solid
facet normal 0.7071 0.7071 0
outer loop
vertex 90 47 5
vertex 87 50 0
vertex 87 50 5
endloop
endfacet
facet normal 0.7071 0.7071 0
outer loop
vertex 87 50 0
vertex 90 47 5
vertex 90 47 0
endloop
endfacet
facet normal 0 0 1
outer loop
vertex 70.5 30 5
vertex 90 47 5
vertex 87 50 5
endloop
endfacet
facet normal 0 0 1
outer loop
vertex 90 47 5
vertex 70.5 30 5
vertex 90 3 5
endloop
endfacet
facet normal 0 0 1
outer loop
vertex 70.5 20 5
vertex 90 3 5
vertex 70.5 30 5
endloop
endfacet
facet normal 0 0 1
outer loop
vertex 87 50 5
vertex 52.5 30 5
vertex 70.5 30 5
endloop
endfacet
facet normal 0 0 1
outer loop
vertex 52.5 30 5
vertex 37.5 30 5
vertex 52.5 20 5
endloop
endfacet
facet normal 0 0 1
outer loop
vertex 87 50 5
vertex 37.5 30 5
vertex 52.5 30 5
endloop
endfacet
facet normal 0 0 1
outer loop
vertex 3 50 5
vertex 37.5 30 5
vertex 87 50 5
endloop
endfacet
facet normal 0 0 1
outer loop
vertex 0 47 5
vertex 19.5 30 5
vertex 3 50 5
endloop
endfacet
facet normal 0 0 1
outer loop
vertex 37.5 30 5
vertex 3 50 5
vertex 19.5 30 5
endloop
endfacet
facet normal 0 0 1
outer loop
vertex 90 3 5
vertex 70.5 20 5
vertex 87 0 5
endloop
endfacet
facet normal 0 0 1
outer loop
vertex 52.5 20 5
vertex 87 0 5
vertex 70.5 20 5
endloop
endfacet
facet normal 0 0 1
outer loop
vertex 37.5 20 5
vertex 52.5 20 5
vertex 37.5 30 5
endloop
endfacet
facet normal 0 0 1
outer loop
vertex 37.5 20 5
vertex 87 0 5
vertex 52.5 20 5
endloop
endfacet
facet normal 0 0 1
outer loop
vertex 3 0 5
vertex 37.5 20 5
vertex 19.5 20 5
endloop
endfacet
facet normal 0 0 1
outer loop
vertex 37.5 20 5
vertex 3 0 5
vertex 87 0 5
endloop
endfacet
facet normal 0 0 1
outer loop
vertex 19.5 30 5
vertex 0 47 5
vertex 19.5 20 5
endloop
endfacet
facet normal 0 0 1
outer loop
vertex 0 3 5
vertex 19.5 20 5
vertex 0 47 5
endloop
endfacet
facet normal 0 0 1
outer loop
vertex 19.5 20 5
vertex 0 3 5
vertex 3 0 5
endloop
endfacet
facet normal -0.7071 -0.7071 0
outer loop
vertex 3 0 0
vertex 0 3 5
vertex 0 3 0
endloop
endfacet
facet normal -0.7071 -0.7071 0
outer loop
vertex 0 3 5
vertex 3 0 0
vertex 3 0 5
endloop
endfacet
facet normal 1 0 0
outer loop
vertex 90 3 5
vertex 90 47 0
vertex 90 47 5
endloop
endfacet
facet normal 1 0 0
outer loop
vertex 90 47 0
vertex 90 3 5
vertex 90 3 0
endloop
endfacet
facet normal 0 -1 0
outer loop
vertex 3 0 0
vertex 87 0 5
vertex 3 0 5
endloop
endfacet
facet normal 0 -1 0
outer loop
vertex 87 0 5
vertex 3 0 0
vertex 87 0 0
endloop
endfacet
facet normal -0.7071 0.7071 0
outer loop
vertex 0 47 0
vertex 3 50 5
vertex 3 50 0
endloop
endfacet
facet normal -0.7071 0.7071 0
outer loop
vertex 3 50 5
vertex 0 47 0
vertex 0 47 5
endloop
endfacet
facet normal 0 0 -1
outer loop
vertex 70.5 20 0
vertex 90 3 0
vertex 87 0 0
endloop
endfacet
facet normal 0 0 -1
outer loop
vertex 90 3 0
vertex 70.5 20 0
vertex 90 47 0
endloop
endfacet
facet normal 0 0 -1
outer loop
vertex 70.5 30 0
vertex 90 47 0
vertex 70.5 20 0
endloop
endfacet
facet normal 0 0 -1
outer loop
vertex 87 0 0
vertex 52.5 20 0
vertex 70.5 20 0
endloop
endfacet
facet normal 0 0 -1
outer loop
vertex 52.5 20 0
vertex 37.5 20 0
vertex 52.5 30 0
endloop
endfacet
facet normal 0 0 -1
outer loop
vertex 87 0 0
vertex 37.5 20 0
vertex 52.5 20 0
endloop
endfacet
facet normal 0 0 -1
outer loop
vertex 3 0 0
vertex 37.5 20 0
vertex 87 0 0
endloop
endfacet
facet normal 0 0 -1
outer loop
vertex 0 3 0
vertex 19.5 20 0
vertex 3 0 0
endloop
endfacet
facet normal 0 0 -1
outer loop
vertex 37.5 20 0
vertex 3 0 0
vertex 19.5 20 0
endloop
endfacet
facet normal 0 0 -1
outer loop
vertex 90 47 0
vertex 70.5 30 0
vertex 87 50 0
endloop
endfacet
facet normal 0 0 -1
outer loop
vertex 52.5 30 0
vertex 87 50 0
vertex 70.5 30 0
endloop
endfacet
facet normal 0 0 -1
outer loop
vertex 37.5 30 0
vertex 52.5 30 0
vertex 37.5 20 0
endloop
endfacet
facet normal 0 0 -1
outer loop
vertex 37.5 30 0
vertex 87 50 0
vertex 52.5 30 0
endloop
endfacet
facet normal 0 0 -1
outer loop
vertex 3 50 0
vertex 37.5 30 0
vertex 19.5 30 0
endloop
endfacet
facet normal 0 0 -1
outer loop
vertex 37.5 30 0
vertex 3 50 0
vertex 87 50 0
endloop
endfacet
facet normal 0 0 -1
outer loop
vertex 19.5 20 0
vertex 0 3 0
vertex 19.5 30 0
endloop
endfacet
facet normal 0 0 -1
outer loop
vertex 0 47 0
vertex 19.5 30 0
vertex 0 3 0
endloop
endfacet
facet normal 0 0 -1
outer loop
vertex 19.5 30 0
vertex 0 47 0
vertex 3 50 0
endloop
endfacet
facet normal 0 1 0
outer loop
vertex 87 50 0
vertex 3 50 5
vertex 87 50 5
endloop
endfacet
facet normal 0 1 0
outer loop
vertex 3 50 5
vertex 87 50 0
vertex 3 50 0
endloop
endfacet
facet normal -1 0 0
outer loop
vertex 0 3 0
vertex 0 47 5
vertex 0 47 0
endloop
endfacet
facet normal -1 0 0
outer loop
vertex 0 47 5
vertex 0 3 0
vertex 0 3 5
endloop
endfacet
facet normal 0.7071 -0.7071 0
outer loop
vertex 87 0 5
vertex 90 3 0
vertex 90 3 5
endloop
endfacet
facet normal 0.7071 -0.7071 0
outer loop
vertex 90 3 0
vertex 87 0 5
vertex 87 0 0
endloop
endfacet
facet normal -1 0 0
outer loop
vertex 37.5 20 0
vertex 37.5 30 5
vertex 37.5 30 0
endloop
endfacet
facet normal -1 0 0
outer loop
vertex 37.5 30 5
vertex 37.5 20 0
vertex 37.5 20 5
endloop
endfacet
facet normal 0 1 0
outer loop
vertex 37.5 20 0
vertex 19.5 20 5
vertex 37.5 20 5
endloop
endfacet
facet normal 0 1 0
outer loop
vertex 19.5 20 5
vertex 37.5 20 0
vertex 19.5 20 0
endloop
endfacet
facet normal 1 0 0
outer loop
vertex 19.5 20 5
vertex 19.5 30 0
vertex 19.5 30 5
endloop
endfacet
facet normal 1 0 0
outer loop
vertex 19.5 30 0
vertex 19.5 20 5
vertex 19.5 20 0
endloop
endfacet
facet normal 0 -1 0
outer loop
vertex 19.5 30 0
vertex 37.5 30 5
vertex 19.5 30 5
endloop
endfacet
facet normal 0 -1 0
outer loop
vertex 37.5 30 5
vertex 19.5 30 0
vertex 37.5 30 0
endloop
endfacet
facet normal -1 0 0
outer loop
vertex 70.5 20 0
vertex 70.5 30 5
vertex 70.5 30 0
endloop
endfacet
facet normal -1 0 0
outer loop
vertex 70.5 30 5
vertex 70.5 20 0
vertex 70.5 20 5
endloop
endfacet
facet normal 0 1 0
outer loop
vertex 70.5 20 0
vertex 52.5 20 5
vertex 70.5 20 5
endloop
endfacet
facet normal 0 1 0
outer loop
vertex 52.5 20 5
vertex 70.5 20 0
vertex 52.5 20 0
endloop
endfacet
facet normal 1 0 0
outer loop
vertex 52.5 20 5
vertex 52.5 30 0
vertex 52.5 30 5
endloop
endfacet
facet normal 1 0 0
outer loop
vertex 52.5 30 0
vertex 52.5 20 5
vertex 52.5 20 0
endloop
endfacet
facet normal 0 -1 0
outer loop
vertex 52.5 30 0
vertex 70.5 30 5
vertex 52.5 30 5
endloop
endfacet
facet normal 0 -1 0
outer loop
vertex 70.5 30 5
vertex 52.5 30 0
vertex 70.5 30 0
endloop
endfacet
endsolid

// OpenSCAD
$fn = 32;

// ----------------------------------------------------------------------
// Windowed plate: 2 voids, 90 x 50 x 5 mm
// ----------------------------------------------------------------------

// --- parameters (mm) ---
plate_l = 90;             // plate length, X
plate_w = 50;             // plate width, Y
plate_t = 5;              // plate thickness, Z
edge_margin = 12;         // wall from the plate edge to any window
windows = 2;              // number of windows in the row
win_l = 18;               // window length
win_w = 10;               // window width
win_pitch = 33;           // window pitch along X
depth_1 = 5;              // depth of void 1 (full thickness = through)
depth_2 = 5;              // depth of void 2 (full thickness = through)
corner_c = 3;             // corner chamfer of the plate

profile = [[3, 0], [87, 0], [90, 3], [90, 47], [87, 50], [3, 50], [0, 47], [0, 3]];  // primary outline, 8 points, counter clockwise
void_1 = [[19.5, 20], [37.5, 20], [37.5, 30], [19.5, 30]];  // window 1 of the row, 4 points
void_2 = [[52.5, 20], [70.5, 20], [70.5, 30], [52.5, 30]];  // window 2 of the row, 4 points

// --- the one profile operation ---
difference() {
  linear_extrude(height = plate_t) polygon(points = profile);
  translate([0, 0, -1])
    linear_extrude(height = plate_t + 2) polygon(points = void_1);
  translate([0, 0, -1])
    linear_extrude(height = plate_t + 2) polygon(points = void_2);
}
